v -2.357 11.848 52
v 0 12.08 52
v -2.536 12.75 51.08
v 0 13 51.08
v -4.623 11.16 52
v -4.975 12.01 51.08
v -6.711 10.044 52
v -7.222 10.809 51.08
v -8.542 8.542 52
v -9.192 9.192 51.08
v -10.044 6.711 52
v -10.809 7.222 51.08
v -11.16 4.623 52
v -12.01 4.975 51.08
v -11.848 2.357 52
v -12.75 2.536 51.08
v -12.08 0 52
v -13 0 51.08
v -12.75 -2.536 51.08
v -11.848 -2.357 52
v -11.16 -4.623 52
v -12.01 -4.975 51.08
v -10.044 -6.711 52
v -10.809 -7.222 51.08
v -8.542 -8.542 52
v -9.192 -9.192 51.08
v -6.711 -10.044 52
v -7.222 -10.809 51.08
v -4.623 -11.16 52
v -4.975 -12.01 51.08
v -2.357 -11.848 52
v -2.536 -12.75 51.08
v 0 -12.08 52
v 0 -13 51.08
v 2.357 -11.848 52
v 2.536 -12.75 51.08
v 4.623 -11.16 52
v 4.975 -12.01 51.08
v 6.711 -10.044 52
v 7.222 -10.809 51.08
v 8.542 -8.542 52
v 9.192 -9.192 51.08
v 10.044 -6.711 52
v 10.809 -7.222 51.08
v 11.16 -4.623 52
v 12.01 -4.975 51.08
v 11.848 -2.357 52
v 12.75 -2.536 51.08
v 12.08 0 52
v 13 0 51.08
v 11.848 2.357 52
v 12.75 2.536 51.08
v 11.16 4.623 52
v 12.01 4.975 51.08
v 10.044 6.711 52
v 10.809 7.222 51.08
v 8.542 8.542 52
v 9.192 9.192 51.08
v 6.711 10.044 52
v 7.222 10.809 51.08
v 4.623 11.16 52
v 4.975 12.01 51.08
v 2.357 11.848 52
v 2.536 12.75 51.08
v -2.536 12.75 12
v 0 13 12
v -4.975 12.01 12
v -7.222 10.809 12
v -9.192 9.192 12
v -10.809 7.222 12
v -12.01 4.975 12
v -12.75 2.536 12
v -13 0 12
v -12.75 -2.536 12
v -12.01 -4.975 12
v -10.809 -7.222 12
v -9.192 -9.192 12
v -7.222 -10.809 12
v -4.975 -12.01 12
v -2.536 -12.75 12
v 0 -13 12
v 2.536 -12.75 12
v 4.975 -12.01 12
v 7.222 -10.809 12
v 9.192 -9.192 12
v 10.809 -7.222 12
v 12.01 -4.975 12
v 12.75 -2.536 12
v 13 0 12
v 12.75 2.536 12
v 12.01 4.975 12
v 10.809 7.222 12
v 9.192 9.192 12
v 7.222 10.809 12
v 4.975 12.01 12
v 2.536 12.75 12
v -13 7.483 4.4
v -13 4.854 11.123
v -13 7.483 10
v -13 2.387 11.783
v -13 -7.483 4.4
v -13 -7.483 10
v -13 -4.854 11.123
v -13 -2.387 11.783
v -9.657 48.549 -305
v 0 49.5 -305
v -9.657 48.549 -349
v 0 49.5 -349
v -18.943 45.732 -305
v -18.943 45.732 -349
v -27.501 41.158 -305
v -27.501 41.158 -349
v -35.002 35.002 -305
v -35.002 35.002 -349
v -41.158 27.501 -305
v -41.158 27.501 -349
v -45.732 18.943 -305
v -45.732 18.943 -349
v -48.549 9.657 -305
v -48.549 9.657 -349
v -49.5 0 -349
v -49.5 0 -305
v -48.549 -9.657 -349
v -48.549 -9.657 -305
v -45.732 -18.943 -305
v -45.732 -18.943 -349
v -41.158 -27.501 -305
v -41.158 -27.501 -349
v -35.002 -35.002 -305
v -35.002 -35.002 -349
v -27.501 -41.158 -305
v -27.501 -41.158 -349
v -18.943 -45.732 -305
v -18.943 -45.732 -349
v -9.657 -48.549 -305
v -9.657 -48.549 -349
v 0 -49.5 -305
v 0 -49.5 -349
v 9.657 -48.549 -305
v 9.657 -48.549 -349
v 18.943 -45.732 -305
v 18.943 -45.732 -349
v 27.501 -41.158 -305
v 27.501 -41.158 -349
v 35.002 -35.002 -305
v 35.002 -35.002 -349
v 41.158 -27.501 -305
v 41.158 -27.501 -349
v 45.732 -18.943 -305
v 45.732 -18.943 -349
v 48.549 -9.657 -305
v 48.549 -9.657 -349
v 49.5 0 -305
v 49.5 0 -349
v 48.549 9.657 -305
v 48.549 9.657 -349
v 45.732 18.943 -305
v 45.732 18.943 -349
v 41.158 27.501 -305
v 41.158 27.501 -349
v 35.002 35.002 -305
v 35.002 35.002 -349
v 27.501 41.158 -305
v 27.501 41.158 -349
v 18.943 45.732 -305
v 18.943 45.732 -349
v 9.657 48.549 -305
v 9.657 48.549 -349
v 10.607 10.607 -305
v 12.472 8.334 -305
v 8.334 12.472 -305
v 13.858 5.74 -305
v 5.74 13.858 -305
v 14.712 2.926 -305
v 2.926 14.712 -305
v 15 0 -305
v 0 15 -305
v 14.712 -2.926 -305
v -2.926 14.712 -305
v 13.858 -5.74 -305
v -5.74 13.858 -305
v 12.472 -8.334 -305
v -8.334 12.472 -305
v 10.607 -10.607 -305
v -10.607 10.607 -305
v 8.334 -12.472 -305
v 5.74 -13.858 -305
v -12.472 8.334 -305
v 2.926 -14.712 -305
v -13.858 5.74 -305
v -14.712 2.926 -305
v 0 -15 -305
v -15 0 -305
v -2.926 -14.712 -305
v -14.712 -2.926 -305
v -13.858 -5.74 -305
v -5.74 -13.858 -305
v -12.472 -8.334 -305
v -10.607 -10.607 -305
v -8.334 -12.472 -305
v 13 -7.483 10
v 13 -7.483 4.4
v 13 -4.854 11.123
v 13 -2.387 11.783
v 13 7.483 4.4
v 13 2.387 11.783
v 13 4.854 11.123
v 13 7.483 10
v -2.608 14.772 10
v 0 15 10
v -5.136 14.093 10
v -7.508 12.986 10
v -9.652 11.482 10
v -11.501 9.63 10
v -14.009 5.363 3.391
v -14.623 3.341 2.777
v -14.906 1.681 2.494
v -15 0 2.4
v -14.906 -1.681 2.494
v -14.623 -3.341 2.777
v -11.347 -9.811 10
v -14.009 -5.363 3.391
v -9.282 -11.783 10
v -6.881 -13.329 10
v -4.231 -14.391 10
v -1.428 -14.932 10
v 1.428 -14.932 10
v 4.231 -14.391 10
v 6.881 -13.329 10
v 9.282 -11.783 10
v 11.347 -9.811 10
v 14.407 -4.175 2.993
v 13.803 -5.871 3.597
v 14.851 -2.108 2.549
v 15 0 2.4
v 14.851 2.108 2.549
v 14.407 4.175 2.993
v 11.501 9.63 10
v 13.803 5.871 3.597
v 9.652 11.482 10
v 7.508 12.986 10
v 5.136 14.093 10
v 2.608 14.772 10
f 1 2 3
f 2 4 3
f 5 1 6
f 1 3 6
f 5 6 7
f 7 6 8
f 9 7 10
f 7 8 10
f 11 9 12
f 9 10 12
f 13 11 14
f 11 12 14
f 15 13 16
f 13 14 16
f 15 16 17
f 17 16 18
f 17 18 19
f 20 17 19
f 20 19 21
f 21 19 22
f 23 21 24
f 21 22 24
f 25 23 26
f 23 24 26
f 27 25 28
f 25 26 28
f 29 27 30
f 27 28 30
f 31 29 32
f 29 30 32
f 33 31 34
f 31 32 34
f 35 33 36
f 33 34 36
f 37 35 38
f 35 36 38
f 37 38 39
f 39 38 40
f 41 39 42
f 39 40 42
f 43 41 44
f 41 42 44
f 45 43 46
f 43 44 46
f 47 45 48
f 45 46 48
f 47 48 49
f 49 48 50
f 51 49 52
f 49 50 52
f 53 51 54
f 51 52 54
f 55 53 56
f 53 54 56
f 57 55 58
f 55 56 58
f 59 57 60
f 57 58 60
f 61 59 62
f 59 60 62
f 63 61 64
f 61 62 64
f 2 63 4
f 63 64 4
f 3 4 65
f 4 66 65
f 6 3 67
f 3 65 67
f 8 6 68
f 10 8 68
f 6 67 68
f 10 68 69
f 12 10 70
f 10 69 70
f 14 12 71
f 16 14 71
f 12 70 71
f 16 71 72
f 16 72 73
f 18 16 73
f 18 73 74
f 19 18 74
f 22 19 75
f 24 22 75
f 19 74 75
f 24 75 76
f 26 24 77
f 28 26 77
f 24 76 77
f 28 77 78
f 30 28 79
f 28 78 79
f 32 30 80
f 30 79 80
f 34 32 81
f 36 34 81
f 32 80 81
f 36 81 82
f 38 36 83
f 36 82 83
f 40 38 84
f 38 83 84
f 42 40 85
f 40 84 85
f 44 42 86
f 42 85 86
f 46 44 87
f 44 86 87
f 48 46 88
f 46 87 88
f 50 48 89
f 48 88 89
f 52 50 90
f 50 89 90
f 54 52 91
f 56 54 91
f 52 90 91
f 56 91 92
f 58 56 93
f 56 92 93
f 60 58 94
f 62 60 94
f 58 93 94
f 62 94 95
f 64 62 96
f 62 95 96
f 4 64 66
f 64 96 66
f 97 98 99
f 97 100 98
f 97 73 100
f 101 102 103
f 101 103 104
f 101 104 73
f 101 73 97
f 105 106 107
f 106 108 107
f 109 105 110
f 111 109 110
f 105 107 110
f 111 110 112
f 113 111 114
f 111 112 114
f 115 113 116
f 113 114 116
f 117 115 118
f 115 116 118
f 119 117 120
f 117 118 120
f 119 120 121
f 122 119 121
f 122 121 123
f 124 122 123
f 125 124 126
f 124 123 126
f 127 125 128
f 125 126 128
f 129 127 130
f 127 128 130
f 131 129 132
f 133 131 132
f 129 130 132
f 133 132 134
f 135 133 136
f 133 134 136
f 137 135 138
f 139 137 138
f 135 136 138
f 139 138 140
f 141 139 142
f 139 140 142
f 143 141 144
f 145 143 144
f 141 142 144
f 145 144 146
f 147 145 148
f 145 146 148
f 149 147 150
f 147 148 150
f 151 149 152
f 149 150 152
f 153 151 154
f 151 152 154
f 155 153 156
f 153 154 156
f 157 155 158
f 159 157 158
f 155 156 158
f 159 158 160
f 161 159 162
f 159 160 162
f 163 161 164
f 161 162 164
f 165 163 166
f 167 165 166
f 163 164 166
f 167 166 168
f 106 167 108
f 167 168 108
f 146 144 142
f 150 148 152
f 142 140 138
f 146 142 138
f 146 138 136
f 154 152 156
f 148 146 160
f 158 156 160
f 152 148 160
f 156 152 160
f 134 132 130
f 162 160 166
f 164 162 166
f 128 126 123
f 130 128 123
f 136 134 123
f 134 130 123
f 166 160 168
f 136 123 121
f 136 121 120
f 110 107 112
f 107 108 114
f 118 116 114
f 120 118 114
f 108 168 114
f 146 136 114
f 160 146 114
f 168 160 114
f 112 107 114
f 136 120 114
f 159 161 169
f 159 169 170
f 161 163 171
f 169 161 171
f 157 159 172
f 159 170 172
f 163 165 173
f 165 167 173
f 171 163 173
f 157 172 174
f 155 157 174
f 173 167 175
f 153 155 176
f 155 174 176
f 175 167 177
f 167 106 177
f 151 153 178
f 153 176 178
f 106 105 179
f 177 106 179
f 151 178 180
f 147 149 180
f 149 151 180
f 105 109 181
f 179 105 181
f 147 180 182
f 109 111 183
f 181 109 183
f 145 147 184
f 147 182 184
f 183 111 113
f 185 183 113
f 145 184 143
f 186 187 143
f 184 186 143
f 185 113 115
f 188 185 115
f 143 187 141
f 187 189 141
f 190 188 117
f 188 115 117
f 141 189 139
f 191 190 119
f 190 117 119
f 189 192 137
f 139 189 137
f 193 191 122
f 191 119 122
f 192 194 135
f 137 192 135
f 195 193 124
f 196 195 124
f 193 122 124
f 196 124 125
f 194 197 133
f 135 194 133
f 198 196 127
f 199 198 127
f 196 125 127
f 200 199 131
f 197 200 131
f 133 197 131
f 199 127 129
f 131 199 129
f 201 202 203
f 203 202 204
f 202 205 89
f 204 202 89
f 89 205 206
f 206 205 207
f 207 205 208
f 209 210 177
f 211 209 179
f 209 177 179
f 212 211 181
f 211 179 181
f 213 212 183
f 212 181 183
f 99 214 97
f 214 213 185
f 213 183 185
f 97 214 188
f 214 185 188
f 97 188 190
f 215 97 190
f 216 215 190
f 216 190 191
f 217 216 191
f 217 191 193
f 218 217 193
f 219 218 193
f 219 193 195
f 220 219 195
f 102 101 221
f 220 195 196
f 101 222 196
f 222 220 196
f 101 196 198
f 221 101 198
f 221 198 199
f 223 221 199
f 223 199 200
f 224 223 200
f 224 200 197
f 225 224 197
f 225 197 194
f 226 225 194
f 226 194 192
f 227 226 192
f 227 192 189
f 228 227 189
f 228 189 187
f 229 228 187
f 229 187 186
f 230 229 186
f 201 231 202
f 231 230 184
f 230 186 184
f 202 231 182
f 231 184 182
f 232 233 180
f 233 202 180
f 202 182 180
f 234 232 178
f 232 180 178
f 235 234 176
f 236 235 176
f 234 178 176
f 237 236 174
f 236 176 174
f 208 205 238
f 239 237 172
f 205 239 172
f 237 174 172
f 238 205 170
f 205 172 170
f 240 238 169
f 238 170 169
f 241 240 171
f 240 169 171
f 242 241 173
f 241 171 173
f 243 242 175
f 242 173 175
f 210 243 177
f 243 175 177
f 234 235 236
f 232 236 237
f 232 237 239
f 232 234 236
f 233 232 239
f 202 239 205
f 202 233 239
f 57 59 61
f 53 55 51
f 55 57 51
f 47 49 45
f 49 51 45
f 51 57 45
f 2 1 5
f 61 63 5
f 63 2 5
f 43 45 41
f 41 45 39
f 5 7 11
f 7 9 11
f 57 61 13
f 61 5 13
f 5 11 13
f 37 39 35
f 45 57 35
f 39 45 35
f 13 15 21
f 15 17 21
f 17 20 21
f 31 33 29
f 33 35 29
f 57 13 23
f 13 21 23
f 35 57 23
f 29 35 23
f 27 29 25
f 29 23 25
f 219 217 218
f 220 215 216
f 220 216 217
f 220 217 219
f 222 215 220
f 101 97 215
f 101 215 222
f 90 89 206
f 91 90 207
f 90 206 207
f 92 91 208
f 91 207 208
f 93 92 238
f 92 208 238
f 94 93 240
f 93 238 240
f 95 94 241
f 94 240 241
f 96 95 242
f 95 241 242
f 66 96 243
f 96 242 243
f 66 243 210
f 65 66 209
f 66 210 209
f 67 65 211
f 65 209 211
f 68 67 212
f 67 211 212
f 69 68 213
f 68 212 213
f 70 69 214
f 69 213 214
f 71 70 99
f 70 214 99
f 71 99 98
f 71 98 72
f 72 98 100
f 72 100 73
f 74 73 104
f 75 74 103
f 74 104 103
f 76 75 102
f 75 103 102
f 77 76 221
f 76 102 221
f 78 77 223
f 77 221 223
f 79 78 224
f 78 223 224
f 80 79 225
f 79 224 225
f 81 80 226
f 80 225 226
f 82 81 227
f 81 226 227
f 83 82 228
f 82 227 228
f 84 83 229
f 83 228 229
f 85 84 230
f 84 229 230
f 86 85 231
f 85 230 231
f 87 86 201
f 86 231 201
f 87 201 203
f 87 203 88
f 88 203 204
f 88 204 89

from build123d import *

# Parameters (mm, degrees)
CUT_EXTRUDE_1_DEPTH      = 15
CUT_EXTRUDE_1_DEPTH_BACK = 15
CUT_EXTRUDE_2_DEPTH      = 15
CUT_EXTRUDE_2_DEPTH_BACK = 15


with BuildPart() as part:
    # 草图1 → 旋转1 (revolve)
    with BuildSketch(Plane(origin=(0, 0, 0), x_dir=(0, 0, -1), z_dir=(1, 0, 0))):
        Polygon((-52, 0), (-52, 12.08), (-51.08, 13), (-12, 13), (-10, 15), (305, 15), (305, 49.5), (349, 49.5), (349, 0), align=None)
    revolve(axis=Axis((0, 0, -349), (0, 0, 1)))

    # 草图2 → 切除-拉伸1 (cut, two sides: drawn at the far end of the back side and taken through both)
    with BuildSketch(Plane(origin=(0, 0, 0), x_dir=(1, 0, 0), z_dir=(0, 1, 0)).offset(-CUT_EXTRUDE_1_DEPTH_BACK)):
        Polygon((13, -4.4), (13, -12), (15, -12), (15, -2.4), align=None)
    extrude(amount=CUT_EXTRUDE_1_DEPTH + CUT_EXTRUDE_1_DEPTH_BACK, mode=Mode.SUBTRACT)

    # 草图3 → 切除-拉伸2 (cut, two sides: drawn at the far end of the back side and taken through both)
    with BuildSketch(Plane(origin=(0, 0, 0), x_dir=(1, 0, 0), z_dir=(0, 1, 0)).offset(-CUT_EXTRUDE_2_DEPTH_BACK)):
        Polygon((-15, -2.4), (-15, -12), (-13, -12), (-13, -4.4), align=None)
    extrude(amount=CUT_EXTRUDE_2_DEPTH + CUT_EXTRUDE_2_DEPTH_BACK, mode=Mode.SUBTRACT)


solid = part.part
